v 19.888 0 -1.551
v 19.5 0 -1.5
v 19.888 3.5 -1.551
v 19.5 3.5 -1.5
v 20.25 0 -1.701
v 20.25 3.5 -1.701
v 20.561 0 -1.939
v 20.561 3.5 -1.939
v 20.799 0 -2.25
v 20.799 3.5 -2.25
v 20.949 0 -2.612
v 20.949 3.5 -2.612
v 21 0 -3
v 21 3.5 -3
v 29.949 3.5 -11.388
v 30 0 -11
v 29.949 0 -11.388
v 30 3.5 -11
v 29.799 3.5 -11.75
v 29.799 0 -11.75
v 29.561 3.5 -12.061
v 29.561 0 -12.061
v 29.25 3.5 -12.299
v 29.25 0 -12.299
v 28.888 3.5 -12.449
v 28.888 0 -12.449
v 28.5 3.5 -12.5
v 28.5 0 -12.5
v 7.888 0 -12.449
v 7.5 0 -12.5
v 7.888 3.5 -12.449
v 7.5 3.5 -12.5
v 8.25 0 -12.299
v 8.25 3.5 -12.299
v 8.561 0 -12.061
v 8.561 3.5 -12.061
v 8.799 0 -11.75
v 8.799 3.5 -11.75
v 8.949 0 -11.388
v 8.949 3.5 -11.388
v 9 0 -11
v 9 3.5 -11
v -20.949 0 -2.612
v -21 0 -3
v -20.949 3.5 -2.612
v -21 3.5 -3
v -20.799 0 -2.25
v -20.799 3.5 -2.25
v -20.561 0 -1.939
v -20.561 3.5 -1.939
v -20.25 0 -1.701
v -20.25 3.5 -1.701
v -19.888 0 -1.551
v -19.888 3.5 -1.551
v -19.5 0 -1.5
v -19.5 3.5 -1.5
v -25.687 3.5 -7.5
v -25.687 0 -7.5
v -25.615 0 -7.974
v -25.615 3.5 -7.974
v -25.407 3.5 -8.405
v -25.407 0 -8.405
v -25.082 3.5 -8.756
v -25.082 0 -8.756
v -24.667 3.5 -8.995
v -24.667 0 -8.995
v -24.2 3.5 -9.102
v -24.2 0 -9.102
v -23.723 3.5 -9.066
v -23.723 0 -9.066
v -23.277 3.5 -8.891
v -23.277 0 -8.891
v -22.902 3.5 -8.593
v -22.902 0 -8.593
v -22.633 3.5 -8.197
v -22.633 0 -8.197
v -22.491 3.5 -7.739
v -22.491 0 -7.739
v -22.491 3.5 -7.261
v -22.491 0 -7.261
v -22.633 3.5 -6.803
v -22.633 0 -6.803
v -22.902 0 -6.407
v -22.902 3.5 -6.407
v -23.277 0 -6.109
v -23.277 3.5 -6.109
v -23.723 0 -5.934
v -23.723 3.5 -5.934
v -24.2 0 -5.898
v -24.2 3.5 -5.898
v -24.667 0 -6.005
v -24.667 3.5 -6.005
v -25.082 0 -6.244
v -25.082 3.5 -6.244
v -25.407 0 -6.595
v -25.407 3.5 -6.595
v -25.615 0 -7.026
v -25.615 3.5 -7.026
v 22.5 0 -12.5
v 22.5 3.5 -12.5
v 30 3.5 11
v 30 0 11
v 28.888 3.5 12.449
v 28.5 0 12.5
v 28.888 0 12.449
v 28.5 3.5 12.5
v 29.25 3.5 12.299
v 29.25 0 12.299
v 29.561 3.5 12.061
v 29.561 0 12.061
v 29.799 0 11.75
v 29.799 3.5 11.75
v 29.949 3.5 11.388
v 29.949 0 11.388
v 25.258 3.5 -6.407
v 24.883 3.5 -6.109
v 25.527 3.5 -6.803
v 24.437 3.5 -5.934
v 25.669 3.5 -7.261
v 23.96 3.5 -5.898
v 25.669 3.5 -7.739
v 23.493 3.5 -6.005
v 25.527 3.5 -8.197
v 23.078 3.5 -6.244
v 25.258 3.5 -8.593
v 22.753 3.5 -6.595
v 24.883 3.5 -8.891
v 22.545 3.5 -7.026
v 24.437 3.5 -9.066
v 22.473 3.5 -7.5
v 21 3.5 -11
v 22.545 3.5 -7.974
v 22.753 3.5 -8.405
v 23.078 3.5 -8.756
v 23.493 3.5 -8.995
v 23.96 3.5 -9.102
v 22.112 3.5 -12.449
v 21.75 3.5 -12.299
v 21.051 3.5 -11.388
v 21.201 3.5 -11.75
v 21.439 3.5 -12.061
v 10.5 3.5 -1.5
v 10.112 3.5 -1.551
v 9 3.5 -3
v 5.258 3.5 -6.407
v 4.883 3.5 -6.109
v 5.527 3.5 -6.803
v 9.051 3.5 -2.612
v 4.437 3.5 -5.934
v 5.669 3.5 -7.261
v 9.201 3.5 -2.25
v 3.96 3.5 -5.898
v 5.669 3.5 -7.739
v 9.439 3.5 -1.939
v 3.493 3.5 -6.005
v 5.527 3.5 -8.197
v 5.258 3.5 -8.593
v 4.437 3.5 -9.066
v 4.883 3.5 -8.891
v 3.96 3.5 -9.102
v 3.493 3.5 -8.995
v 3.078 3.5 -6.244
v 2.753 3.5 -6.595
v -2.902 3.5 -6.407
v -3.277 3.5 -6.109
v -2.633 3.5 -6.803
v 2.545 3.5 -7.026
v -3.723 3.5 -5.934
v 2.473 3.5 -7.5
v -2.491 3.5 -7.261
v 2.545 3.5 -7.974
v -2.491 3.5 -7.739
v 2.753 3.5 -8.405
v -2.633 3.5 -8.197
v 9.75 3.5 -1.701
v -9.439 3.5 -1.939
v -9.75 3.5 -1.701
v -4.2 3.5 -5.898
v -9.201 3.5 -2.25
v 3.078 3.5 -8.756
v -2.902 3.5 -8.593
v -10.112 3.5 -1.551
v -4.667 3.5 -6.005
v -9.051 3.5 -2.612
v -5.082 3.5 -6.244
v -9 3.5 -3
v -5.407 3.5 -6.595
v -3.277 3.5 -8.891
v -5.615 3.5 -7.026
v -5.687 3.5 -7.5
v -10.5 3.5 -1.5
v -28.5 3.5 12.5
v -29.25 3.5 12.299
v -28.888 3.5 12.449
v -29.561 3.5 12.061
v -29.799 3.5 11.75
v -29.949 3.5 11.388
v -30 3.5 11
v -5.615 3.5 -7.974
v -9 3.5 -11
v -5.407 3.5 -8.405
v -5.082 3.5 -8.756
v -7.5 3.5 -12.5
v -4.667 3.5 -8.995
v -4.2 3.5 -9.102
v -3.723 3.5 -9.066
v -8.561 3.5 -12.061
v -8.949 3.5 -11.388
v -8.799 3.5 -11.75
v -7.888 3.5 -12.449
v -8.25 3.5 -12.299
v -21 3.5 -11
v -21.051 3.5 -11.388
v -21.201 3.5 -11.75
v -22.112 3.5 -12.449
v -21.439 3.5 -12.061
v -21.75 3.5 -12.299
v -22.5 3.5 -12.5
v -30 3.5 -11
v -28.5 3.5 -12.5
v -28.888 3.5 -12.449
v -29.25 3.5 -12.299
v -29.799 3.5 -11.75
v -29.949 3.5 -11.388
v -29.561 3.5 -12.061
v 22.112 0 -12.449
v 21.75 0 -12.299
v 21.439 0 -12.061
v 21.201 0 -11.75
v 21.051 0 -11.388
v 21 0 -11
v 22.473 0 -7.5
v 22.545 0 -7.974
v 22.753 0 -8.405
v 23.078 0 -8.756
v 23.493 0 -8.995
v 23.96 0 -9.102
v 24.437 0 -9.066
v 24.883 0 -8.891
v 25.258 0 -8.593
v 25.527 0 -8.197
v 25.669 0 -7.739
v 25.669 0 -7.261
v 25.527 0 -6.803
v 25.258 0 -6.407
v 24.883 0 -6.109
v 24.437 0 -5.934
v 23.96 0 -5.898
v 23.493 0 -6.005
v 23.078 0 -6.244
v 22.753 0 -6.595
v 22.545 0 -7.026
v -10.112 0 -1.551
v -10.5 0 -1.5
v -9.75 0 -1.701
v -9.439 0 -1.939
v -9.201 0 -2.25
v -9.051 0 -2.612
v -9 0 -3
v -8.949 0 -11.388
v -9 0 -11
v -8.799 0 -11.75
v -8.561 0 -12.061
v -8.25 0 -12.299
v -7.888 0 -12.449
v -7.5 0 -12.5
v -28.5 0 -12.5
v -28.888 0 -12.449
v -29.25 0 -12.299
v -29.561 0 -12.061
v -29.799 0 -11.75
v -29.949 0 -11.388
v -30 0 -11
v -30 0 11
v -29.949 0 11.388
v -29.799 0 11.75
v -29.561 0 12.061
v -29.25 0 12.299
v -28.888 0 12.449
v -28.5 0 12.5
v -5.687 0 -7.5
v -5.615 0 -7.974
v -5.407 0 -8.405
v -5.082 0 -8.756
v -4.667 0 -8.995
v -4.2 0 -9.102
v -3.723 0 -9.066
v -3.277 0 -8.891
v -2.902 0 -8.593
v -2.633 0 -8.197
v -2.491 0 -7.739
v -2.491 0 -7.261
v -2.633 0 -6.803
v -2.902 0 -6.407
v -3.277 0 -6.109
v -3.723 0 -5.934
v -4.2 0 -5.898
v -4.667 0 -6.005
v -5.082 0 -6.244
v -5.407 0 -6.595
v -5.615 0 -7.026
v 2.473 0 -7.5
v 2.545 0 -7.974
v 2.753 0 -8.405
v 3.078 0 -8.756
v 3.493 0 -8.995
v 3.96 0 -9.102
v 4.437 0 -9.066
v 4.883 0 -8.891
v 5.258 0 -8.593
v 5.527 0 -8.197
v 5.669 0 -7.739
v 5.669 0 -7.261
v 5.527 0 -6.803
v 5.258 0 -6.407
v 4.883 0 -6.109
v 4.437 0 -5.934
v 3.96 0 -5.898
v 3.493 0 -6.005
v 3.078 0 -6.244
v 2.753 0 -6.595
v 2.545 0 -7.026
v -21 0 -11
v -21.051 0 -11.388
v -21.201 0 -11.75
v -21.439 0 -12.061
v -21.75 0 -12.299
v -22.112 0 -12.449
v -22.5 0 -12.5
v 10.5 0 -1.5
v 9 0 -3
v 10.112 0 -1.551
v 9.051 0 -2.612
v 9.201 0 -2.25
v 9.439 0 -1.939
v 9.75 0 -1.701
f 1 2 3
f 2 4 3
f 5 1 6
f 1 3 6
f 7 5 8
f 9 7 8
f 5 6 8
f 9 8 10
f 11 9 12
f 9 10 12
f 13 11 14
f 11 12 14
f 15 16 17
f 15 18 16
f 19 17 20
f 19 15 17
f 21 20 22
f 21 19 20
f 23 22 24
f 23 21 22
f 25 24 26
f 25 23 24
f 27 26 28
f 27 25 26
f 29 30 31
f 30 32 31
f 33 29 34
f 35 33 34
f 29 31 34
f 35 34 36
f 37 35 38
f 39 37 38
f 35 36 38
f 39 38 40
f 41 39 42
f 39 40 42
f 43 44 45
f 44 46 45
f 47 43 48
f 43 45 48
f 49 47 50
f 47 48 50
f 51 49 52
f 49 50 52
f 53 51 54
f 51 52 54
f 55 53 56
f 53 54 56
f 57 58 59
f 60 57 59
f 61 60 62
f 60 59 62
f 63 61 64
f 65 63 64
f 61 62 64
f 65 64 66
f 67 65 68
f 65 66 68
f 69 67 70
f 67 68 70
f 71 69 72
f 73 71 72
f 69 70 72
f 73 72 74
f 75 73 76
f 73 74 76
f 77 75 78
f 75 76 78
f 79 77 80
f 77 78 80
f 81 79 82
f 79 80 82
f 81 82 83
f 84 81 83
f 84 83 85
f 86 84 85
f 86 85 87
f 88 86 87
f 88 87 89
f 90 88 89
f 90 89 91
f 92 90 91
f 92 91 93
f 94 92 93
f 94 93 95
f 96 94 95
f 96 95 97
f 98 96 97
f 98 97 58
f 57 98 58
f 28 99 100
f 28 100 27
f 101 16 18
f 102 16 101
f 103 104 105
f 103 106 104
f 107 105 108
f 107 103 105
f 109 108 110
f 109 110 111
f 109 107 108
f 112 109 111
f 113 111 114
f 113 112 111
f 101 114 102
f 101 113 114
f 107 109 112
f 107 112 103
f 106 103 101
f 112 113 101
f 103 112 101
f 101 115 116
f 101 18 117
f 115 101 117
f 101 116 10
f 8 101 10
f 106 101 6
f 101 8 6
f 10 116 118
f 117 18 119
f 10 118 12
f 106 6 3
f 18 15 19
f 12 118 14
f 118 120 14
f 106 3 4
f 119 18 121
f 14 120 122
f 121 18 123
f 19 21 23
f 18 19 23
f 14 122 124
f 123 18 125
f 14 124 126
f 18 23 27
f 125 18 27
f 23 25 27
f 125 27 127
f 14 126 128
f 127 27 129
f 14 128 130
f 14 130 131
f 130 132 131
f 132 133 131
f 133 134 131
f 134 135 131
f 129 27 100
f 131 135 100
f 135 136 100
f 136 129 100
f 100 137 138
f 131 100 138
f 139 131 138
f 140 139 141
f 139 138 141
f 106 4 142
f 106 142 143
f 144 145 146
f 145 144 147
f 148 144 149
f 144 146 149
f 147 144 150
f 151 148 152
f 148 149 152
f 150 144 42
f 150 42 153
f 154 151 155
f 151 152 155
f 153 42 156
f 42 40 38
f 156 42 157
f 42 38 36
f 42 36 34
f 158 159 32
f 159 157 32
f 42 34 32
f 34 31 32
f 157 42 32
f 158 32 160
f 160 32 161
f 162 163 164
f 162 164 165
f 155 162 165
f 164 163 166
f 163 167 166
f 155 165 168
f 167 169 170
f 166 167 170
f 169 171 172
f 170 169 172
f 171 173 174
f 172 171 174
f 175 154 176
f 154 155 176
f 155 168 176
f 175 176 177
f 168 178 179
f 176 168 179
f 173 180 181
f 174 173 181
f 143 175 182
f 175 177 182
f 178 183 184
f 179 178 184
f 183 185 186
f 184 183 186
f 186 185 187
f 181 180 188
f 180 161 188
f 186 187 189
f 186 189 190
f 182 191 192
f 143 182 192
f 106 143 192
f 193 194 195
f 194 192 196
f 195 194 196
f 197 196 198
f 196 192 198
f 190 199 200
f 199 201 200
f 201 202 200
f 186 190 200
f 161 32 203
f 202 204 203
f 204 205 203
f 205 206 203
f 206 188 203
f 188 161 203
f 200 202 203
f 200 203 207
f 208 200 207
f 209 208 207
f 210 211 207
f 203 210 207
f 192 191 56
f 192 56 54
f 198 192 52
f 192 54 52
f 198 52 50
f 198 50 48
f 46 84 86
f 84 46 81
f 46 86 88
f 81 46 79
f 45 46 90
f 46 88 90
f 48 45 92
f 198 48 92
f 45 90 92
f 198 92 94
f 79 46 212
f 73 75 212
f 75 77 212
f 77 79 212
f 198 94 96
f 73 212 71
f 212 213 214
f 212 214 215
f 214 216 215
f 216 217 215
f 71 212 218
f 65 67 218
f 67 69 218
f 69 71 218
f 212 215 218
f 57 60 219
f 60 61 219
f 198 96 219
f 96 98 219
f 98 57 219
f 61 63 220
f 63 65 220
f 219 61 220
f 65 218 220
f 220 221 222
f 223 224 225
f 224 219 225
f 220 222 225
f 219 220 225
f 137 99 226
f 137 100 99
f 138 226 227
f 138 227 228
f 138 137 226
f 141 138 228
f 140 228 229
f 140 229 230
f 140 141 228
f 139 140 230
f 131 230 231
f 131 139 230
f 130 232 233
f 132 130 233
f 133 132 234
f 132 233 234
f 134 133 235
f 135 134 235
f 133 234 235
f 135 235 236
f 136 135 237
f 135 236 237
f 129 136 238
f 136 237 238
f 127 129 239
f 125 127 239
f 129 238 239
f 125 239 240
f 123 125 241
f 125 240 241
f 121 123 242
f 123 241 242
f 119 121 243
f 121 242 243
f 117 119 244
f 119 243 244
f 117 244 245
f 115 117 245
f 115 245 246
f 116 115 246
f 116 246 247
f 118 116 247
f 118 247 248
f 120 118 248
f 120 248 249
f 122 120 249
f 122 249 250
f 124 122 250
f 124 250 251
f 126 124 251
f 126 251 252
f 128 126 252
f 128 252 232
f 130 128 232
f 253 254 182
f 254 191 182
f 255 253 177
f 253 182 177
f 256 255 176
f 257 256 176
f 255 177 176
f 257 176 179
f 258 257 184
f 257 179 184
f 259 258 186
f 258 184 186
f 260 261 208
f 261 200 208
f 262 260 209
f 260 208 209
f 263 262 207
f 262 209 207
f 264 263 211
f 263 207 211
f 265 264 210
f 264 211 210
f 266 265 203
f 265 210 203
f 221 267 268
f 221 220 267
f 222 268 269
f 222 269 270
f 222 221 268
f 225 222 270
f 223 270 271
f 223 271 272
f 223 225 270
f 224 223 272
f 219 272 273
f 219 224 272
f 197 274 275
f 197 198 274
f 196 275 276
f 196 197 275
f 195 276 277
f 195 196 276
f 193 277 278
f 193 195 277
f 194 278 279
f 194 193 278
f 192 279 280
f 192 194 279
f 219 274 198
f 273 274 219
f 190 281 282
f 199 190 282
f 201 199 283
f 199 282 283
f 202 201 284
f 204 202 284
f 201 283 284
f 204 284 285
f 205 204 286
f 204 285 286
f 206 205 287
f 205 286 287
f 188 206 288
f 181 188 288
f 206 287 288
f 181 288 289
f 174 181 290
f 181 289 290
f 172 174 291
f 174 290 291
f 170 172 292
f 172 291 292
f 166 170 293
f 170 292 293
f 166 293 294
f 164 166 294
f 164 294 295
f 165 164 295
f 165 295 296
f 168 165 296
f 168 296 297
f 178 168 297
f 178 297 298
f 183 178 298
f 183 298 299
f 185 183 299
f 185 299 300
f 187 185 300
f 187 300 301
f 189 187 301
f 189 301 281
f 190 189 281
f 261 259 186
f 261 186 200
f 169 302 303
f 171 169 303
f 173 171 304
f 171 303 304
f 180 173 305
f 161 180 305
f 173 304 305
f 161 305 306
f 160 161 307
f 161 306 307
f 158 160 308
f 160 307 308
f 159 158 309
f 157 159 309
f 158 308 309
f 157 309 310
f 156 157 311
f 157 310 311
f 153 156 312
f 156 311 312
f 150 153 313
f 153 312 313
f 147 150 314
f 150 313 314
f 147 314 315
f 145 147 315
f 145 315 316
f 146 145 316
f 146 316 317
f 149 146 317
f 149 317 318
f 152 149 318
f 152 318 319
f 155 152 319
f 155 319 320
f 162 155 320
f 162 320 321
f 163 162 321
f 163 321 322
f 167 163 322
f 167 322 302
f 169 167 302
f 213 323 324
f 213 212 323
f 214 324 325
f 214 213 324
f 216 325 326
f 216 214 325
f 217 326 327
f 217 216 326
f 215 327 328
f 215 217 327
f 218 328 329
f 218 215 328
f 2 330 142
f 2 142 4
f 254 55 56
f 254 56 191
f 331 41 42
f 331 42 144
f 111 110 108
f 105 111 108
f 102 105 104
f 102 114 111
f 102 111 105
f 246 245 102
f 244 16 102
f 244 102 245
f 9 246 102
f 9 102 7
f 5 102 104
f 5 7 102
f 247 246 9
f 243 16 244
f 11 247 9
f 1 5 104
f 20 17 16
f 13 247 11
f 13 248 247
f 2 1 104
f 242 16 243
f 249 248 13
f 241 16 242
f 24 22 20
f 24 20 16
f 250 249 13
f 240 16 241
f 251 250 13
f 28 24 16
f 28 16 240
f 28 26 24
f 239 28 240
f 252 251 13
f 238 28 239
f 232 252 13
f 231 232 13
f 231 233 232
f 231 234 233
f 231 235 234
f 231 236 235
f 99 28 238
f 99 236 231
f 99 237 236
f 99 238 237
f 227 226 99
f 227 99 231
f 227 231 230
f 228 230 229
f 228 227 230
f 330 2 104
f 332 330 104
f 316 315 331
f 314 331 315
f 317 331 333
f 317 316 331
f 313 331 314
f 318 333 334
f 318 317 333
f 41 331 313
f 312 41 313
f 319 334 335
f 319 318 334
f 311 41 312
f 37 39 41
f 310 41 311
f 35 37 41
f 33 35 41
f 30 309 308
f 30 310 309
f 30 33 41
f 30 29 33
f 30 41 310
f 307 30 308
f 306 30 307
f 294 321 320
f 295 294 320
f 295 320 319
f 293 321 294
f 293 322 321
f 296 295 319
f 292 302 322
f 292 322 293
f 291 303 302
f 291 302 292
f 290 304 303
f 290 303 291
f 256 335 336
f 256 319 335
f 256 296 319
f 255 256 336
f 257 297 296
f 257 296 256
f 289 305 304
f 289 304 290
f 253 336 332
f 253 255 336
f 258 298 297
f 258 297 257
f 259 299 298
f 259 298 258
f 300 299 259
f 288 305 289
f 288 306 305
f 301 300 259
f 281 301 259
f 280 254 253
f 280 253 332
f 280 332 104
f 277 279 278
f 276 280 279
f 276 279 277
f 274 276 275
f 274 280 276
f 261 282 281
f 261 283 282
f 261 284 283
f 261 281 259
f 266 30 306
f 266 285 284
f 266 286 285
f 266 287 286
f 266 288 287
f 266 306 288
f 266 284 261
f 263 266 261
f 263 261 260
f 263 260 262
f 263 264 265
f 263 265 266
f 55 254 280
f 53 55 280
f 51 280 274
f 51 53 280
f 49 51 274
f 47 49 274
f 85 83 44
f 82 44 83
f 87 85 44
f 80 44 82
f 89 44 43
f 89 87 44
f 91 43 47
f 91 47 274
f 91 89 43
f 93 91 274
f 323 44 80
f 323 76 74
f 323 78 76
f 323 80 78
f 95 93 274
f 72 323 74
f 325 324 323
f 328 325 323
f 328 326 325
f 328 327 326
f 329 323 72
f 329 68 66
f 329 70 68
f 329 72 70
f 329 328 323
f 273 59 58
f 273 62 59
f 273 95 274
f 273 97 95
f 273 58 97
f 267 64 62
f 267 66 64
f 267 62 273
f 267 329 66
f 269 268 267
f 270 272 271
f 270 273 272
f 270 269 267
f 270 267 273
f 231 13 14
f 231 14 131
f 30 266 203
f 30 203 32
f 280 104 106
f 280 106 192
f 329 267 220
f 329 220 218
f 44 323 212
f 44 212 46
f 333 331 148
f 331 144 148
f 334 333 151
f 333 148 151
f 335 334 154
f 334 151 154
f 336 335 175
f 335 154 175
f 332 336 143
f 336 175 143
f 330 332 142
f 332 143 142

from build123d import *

# Parameters (mm, degrees)
BOSS_EXTRUDE1_DEPTH   = 3.5
F_2_CLEARANCE_HOLE1_D = 3.2131
FILLET1_R             = 1.5


with BuildPart() as part:
    # Sketch1 → Boss-Extrude1 (new body)
    with BuildSketch(Plane(origin=(0, 0, 0), x_dir=(1, 0, 0), z_dir=(0, 1, 0))):
        Polygon((-21, 12.5), (-21, 1.5), (-9, 1.5), (-9, 12.5), (9, 12.5), (9, 1.5), (21, 1.5), (21, 12.5), (30, 12.5), (30, -12.5), (-30, -12.5), (-30, 12.5), align=None)
    extrude(amount=BOSS_EXTRUDE1_DEPTH)

    # #2 Clearance Hole1 (through all)
    with Locations(Plane(origin=(0, 3.5, 0), x_dir=(1, 0, 0), z_dir=(0, 1, 0))):
        with Locations((24.079999968, 7.5), (-24.079999968, 7.5), (-4.079999968, 7.5), (4.079999968, 7.5)):
            Hole(F_2_CLEARANCE_HOLE1_D / 2)

    # Fillet1
    fillet1_edges = [part.edges().sort_by_distance(p)[0] for p in [
        (30, 1.75, -12.5),
        (30, 1.75, 12.5),
        (-30, 1.75, 12.5),
        (-30, 1.75, -12.5),
        (-21, 1.75, -12.5),
        (-21, 1.75, -1.5),
        (-9, 1.75, -1.5),
        (-9, 1.75, -12.5),
        (9, 1.75, -12.5),
        (9, 1.75, -1.5),
        (21, 1.75, -1.5),
        (21, 1.75, -12.5),
    ]]
    fillet(fillet1_edges, radius=FILLET1_R)


solid = part.part
